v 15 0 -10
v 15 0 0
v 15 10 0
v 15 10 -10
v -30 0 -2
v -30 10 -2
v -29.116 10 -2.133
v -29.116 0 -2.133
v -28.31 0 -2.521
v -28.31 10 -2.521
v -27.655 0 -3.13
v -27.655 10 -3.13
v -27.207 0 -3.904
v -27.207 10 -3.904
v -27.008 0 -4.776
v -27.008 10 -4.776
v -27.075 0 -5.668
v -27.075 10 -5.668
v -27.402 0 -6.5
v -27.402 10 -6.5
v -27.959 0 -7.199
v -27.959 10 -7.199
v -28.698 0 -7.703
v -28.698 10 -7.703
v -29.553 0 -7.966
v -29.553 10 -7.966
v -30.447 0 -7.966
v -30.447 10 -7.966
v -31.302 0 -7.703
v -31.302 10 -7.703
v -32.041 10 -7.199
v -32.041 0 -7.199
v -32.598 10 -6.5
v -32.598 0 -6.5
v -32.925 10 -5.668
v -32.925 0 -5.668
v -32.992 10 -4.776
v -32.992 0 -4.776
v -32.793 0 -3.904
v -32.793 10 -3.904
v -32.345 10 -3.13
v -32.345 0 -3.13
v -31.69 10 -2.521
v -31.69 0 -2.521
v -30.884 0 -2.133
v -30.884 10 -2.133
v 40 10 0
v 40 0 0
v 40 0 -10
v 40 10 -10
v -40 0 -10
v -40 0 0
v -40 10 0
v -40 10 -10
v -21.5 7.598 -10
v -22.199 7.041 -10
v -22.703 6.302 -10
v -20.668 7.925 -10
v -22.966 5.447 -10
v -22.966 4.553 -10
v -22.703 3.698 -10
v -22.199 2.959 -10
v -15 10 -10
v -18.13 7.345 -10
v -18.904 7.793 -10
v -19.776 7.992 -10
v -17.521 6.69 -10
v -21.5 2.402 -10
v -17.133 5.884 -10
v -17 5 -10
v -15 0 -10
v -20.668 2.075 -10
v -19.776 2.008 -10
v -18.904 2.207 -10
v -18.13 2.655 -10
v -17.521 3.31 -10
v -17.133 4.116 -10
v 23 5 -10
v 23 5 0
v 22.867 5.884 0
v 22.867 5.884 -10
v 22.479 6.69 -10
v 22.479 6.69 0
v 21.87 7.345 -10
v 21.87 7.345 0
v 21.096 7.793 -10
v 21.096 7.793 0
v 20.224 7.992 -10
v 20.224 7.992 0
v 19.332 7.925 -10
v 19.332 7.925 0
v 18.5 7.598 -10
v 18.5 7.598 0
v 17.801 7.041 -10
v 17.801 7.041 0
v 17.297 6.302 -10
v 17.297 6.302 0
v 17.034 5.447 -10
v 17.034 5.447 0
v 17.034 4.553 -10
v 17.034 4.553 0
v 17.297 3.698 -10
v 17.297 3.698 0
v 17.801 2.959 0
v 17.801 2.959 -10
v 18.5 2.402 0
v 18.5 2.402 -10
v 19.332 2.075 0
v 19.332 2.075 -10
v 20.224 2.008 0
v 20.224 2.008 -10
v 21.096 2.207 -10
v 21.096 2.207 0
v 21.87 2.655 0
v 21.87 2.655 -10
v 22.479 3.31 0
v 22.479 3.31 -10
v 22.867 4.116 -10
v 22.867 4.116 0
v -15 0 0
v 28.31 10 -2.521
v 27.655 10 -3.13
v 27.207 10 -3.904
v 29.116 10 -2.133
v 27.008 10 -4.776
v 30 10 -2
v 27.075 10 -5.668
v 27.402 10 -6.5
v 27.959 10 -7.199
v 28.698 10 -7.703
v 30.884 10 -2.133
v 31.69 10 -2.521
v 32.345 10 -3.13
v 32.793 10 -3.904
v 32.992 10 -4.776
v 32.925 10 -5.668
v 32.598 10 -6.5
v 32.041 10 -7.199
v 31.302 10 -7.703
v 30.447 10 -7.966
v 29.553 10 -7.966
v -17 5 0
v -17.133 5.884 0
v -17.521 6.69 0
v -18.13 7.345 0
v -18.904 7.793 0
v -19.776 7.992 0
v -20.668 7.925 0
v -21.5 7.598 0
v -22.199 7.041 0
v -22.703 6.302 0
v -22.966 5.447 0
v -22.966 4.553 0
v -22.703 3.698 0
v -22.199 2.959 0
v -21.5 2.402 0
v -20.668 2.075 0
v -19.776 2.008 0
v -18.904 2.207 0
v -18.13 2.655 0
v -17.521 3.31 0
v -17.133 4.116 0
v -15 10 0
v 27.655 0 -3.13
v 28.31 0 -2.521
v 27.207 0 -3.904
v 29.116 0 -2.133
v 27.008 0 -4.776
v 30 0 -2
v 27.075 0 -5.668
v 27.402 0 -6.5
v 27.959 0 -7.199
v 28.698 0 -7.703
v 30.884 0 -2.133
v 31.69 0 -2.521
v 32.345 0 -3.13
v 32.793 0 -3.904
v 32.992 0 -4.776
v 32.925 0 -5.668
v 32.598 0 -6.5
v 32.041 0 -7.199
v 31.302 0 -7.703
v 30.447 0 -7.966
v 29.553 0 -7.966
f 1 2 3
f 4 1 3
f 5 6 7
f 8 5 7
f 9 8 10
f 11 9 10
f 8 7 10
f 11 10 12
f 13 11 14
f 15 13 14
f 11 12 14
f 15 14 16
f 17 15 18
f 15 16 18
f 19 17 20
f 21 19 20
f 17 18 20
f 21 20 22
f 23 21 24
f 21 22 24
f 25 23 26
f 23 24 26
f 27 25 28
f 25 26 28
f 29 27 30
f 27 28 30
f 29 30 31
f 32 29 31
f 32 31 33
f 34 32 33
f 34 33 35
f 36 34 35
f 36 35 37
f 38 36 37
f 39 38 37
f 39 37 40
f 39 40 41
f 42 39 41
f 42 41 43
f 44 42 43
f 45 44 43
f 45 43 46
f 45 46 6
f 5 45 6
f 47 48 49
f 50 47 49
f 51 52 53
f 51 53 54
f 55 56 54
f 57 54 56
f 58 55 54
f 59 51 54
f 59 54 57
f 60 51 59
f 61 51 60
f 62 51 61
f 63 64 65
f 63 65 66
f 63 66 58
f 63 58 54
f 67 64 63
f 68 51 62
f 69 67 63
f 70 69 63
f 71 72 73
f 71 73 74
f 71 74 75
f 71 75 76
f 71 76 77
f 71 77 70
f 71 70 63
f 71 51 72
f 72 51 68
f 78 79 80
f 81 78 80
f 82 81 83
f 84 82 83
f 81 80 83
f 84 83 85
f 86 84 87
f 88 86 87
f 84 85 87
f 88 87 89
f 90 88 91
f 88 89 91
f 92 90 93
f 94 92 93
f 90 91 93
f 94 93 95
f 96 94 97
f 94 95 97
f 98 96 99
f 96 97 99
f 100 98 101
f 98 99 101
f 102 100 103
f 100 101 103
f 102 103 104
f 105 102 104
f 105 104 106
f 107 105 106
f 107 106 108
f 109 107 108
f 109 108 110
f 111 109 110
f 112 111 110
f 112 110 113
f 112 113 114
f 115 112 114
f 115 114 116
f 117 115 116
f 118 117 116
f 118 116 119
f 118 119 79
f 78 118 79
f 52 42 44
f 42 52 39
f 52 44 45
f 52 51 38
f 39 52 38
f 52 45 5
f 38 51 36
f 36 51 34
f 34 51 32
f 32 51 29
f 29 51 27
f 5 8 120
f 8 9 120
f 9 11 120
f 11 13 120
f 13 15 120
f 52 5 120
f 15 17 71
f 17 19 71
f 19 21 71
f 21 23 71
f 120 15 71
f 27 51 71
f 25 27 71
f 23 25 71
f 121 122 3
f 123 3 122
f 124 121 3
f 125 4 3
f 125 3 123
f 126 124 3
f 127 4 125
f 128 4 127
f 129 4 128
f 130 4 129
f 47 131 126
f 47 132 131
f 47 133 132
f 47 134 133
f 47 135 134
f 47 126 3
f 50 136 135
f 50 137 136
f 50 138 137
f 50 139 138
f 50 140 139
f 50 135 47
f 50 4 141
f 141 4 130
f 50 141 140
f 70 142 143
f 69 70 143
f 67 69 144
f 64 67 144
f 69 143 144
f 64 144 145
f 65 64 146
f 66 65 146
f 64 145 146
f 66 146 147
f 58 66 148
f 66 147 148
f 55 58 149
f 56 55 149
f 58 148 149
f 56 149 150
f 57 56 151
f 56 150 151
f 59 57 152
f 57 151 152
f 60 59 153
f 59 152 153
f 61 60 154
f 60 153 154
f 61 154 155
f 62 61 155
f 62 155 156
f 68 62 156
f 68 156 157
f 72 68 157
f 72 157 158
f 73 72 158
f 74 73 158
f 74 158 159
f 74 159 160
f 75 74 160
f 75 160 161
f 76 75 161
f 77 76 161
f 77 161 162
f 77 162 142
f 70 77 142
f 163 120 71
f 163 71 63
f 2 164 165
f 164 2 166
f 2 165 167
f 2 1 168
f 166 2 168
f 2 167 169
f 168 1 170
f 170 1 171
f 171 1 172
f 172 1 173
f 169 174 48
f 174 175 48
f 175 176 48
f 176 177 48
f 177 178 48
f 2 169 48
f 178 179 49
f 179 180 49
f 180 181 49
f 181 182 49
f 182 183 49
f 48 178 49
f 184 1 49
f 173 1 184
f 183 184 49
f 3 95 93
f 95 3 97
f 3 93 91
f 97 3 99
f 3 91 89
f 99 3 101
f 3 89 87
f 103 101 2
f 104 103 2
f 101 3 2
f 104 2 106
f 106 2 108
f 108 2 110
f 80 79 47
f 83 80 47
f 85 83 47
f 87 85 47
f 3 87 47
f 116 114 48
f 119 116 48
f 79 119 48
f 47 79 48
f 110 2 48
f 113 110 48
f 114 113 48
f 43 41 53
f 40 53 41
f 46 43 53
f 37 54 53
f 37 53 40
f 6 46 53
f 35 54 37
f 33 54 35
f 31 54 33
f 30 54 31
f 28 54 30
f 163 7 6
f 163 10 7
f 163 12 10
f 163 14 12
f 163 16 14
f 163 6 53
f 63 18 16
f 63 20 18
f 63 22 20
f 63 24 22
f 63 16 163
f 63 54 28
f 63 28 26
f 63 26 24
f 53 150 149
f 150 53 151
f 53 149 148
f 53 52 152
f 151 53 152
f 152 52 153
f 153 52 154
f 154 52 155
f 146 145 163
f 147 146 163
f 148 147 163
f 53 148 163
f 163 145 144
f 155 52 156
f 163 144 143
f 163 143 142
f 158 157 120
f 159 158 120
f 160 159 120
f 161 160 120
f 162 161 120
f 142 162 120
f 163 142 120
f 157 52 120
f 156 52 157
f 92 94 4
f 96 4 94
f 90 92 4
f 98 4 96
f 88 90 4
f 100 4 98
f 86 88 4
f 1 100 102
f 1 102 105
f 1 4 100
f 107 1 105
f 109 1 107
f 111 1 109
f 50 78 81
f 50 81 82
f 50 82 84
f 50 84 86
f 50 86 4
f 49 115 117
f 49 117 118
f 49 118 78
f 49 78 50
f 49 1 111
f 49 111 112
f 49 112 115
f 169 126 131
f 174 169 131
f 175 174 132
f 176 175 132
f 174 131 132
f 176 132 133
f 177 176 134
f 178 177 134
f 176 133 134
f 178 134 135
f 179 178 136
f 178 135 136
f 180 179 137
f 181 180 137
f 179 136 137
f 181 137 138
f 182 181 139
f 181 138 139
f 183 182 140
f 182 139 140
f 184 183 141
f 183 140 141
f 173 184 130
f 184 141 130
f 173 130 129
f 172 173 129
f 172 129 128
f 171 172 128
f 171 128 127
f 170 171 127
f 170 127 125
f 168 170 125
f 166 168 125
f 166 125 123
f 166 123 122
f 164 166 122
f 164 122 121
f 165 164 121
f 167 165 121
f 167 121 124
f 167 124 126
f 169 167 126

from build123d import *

# Parameters (mm, degrees)
ESQUISSE1_W      = 80
ESQUISSE1_H      = 10
EXTRUSION1_DEPTH = 10
ESQUISSE2_R      = 3
EXTRUSION2_DEPTH = 43.426406871
ESQUISSE3_R      = 3
EXTRUSION3_DEPTH = 43.426406871
ESQUISSE4_W      = 30
ESQUISSE4_H      = 26.006337845
EXTRUSION4_DEPTH = 43.426406871


with BuildPart() as part:
    # Esquisse1 → Extrusion1 (new body)
    with BuildSketch(Plane(origin=(0, 0, 0), x_dir=(1, 0, 0), z_dir=(0, 1, 0))):
        with Locations((0, 5)):
            Rectangle(ESQUISSE1_W, ESQUISSE1_H)
    extrude(amount=EXTRUSION1_DEPTH)

    # Esquisse2 → Extrusion2 (cut, through all)
    with BuildSketch(Plane.XY):
        with Locations((20, 5)):
            Circle(ESQUISSE2_R)
        with Locations((-20, 5)):
            Circle(ESQUISSE2_R)
    extrude(amount=-EXTRUSION2_DEPTH, mode=Mode.SUBTRACT)

    # Esquisse3 → Extrusion3 (cut, through all)
    with BuildSketch(Plane(origin=(0, 10, 0), x_dir=(1, 0, 0), z_dir=(0, 1, 0))):
        with Locations(Location((30, 5, 0), (0, 0, 270))):
            Circle(ESQUISSE3_R)
        with Locations(Location((-30, 5, 0), (0, 0, 270))):
            Circle(ESQUISSE3_R)
    extrude(amount=-EXTRUSION3_DEPTH, mode=Mode.SUBTRACT)

    # Esquisse4 → Extrusion4 (cut, through all)
    with BuildSketch(Plane.XY):
        with Locations((0, 3.418533509)):
            Rectangle(ESQUISSE4_W, ESQUISSE4_H)
    extrude(amount=-EXTRUSION4_DEPTH, mode=Mode.SUBTRACT)


with BuildPart() as extrusion4_piece_1:
    # of the separate pieces the step leaves, piece 1, a body of its own (extrusion4_pieces)
    add(part.part.solids().sort_by_distance((15, 0, -10))[0])


with BuildPart() as extrusion4_piece_2:
    # of the separate pieces the step leaves, piece 2, a body of its own (extrusion4_pieces)
    add(part.part.solids().sort_by_distance((-40, 0, -10))[0])


solid = Compound([extrusion4_piece_1.part, extrusion4_piece_2.part])
